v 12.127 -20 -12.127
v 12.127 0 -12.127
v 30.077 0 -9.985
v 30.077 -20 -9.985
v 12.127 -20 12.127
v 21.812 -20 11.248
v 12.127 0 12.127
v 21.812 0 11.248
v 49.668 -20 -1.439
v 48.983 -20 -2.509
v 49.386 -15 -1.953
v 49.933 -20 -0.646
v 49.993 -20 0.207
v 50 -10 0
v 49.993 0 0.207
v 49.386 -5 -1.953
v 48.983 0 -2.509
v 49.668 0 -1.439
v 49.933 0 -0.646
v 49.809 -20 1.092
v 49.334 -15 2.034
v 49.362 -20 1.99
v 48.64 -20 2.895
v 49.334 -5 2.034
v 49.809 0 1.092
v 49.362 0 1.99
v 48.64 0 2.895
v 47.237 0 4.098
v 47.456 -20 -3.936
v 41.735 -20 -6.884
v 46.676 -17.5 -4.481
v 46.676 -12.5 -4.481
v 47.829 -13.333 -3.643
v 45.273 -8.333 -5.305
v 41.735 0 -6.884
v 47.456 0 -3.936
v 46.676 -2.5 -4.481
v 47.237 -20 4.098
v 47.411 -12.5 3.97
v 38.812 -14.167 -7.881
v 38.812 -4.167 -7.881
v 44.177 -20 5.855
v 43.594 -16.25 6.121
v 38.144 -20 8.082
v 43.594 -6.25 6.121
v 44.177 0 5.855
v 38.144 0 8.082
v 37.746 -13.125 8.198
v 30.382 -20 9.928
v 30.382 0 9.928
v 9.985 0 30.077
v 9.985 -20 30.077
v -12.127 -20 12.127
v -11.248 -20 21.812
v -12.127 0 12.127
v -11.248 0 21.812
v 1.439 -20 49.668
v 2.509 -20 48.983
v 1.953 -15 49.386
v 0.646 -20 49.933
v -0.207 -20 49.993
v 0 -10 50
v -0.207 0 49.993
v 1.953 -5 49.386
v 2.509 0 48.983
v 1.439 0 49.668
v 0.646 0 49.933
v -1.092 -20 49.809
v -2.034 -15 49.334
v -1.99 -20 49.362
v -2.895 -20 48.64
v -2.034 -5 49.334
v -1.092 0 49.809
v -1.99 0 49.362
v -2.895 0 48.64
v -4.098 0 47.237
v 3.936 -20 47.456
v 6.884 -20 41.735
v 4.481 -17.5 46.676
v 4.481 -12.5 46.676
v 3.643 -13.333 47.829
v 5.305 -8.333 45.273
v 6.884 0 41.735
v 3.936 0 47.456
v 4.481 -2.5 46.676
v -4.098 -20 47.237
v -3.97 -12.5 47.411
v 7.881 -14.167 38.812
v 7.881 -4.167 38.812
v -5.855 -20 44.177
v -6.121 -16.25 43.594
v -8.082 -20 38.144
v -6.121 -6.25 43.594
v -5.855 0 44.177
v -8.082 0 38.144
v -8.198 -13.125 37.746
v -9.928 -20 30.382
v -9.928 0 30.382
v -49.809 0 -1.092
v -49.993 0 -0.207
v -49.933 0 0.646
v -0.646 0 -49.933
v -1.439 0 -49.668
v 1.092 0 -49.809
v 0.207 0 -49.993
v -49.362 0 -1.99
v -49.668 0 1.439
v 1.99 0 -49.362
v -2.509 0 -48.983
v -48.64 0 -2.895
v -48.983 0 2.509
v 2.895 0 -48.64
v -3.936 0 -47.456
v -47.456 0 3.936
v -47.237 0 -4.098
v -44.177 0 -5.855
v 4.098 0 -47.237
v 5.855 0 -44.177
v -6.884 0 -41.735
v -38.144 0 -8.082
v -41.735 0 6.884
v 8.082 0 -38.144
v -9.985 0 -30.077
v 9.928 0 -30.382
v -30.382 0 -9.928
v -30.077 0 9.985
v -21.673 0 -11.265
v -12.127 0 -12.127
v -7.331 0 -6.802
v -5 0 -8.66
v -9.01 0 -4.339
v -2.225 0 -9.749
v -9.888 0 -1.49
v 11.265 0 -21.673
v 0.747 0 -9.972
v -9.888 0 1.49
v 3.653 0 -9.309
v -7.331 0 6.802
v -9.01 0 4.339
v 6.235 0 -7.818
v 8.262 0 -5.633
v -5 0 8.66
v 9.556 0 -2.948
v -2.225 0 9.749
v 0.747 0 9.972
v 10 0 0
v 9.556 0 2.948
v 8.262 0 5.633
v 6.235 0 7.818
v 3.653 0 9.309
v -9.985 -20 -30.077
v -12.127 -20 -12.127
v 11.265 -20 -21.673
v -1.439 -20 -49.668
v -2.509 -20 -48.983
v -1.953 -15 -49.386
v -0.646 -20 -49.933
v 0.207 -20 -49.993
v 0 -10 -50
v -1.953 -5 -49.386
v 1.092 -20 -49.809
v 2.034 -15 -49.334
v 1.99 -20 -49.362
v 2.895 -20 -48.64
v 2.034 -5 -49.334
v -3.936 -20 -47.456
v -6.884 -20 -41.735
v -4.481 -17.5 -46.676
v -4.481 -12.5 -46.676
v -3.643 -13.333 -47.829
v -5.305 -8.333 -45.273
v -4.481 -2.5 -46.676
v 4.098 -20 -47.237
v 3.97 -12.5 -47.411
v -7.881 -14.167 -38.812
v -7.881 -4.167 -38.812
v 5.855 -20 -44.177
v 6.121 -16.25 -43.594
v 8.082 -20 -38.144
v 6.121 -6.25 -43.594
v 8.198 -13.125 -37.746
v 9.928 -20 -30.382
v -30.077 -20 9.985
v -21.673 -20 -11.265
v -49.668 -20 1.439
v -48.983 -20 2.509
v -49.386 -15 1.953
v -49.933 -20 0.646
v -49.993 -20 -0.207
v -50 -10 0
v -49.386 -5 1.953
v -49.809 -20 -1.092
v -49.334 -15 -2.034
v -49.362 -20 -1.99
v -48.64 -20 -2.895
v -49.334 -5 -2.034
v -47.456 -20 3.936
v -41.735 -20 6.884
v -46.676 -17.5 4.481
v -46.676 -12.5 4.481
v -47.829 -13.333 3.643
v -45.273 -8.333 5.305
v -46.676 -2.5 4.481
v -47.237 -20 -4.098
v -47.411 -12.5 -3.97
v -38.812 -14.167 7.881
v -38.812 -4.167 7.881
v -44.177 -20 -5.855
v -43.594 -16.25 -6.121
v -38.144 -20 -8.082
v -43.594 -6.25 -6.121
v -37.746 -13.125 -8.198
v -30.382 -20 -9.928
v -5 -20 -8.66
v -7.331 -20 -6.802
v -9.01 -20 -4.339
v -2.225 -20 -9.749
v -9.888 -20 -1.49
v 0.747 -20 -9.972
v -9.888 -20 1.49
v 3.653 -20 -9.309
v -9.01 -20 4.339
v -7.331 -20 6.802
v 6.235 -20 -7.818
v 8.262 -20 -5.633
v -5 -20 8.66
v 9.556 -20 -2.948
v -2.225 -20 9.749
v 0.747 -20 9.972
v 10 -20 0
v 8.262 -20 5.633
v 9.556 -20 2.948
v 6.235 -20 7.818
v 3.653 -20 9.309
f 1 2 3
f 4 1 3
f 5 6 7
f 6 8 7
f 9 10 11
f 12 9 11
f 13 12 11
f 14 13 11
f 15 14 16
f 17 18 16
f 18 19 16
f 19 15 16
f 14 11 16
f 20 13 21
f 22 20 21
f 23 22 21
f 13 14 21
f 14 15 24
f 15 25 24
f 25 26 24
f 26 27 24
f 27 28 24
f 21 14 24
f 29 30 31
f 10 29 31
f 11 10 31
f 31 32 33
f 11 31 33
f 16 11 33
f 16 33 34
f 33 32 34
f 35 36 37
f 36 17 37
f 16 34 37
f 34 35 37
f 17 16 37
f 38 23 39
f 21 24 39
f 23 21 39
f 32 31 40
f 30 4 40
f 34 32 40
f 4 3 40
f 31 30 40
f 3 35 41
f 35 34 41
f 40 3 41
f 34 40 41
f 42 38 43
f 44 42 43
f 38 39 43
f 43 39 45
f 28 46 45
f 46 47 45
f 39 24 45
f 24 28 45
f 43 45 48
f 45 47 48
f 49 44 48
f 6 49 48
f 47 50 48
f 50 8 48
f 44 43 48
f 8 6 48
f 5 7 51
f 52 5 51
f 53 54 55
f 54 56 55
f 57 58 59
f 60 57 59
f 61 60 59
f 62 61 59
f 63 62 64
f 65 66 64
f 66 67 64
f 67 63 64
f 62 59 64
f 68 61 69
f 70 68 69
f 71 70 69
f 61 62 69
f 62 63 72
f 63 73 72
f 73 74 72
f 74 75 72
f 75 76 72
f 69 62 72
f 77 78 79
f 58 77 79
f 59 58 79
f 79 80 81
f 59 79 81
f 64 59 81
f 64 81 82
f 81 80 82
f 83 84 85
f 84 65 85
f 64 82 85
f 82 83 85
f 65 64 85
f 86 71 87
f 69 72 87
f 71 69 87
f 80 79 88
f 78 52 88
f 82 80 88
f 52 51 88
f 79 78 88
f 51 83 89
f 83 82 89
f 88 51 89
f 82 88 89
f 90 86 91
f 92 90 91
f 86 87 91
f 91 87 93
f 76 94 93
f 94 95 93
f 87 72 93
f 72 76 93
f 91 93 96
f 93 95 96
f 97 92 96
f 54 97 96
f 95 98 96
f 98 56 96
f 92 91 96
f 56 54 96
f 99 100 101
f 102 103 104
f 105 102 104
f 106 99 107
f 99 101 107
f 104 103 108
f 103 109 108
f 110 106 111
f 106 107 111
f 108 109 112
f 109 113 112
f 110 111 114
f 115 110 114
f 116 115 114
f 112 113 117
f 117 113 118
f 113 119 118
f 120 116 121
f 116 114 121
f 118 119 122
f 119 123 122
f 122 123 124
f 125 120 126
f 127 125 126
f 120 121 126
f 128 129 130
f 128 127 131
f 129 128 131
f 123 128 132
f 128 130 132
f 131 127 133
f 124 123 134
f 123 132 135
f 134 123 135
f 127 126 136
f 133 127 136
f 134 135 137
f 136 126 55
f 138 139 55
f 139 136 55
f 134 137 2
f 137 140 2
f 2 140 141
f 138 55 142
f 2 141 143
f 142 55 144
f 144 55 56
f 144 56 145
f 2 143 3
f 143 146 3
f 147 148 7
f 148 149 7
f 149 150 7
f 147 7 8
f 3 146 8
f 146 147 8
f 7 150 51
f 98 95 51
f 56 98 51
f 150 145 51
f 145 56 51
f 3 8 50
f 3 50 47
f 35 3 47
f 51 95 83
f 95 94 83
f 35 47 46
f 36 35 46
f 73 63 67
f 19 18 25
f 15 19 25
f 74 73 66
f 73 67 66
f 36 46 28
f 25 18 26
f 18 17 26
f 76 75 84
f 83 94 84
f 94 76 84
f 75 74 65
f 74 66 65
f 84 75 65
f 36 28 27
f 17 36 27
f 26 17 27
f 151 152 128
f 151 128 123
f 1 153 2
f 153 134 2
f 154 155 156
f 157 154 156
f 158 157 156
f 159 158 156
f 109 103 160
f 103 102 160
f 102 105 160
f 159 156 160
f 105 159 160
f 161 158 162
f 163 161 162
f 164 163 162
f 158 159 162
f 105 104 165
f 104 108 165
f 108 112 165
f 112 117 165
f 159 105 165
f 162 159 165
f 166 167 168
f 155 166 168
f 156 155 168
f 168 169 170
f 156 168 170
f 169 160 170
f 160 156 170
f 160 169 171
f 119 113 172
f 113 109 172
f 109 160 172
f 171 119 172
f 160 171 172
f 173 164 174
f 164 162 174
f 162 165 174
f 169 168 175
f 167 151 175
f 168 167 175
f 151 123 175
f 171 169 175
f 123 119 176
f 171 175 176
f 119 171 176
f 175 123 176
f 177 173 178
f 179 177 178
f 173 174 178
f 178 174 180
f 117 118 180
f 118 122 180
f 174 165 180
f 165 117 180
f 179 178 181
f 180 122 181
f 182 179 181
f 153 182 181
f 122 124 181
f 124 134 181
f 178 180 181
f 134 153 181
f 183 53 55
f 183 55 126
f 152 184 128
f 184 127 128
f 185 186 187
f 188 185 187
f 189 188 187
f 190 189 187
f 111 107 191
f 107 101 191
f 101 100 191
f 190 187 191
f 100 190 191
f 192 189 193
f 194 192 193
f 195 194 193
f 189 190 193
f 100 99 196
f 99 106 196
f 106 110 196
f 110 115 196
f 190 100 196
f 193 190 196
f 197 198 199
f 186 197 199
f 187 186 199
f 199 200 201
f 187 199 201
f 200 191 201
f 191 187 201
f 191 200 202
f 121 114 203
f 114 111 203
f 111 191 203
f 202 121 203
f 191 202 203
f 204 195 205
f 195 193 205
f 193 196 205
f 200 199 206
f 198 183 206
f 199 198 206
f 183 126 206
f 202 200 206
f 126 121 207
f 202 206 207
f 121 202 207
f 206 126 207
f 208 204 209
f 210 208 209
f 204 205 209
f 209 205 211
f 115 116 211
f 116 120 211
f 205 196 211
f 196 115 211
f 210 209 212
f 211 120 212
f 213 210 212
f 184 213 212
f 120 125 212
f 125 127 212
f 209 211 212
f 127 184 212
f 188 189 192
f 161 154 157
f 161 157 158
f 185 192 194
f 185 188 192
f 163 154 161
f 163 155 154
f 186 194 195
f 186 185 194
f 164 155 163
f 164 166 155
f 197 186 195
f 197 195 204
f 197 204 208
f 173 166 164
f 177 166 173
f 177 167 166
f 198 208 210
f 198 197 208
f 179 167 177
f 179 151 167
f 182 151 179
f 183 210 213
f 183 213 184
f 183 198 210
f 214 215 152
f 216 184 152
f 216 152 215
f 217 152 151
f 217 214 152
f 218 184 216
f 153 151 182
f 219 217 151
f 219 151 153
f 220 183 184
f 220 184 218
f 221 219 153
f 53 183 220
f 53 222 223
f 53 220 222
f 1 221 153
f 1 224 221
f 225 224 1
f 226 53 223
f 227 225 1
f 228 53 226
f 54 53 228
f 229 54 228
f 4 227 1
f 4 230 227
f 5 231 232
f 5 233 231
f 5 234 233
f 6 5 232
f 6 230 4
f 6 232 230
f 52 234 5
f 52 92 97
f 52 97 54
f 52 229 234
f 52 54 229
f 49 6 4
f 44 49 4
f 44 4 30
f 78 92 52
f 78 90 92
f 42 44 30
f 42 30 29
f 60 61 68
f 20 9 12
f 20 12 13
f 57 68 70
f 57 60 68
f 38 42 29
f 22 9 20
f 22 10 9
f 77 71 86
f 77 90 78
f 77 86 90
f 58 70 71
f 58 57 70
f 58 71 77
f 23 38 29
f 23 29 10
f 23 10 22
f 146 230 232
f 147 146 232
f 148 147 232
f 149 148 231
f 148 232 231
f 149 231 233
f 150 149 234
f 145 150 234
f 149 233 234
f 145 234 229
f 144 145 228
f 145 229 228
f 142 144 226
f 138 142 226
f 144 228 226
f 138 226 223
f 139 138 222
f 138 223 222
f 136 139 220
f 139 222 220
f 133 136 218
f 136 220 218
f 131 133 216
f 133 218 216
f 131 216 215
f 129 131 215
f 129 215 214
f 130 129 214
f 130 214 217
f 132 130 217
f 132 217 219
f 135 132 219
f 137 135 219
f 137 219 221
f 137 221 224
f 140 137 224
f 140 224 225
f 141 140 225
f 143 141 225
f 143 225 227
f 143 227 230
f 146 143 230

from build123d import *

# Parameters (mm, degrees)
F1_DEPTH = 20
F2_R     = 10
F3_DEPTH = 20.0010001


with BuildPart() as f1:
    # F0 (on Front) → F1 (new body)
    with BuildSketch(Plane.XZ):
        with BuildLine():
            add(Edge.make_bspline(
                [(12.1267812518, 12.1267812518), (9.7597050801, 50), (0, 50)],
                knots=[4.9573676435, 4.9573676435, 4.9573676435, 6.2831853072, 6.2831853072, 6.2831853072], degree=2, weights=[1, 0.788205438, 1]))
            add(Edge.make_bspline(
                [(0, 50), (-9.7597050801, 50), (-12.1267812518, 12.1267812518)],
                knots=[0, 0, 0, 1.3258176637, 1.3258176637, 1.3258176637], degree=2, weights=[1, 0.788205438, 1]))
            add(Edge.make_bspline(
                [(12.1267812518, 12.1267812518), (0, 12.8847050801), (-12.1267812518, 12.1267812518)],
                knots=[1.3258176637, 1.3258176637, 1.3258176637, 1.8157749899, 1.8157749899, 1.8157749899], degree=2, weights=[1, 0.9701425001, 1]))
        make_face()
        with BuildLine():
            add(Edge.make_bspline(
                [(12.1267812518, 12.1267812518), (0, 12.8847050801), (-12.1267812518, 12.1267812518)],
                knots=[1.3258176637, 1.3258176637, 1.3258176637, 1.8157749899, 1.8157749899, 1.8157749899], degree=2, weights=[1, 0.9701425001, 1]))
            add(Edge.make_bspline(
                [(-12.1267812518, 12.1267812518), (-12.8847050801, 0), (-12.1267812518, -12.1267812518)],
                knots=[1.3258176637, 1.3258176637, 1.3258176637, 1.8157749899, 1.8157749899, 1.8157749899], degree=2, weights=[1, 0.9701425001, 1]))
            add(Edge.make_bspline(
                [(-12.1267812518, -12.1267812518), (0, -12.8847050801), (12.1267812518, -12.1267812518)],
                knots=[4.4674103173, 4.4674103173, 4.4674103173, 4.9573676435, 4.9573676435, 4.9573676435], degree=2, weights=[1, 0.9701425001, 1]))
            add(Edge.make_bspline(
                [(12.1267812518, -12.1267812518), (12.8847050801, 0), (12.1267812518, 12.1267812518)],
                knots=[4.4674103173, 4.4674103173, 4.4674103173, 4.9573676435, 4.9573676435, 4.9573676435], degree=2, weights=[1, 0.9701425001, 1]))
        make_face()
        with BuildLine():
            add(Edge.make_bspline(
                [(-12.1267812518, 12.1267812518), (-12.8847050801, 0), (-12.1267812518, -12.1267812518)],
                knots=[1.3258176637, 1.3258176637, 1.3258176637, 1.8157749899, 1.8157749899, 1.8157749899], degree=2, weights=[1, 0.9701425001, 1]))
            add(Edge.make_bspline(
                [(-12.1267812518, 12.1267812518), (-50, 9.7597050801), (-50, 0), (-50, -9.7597050801), (-12.1267812518, -12.1267812518)],
                knots=[1.8157749899, 1.8157749899, 1.8157749899, 3.1415926536, 3.1415926536, 4.4674103173, 4.4674103173, 4.4674103173], degree=2, weights=[1, 0.788205438, 1, 0.788205438, 1]))
        make_face()
        with BuildLine():
            add(Edge.make_bspline(
                [(50, 0), (50, 9.7597050801), (12.1267812518, 12.1267812518)],
                knots=[0, 0, 0, 1.3258176637, 1.3258176637, 1.3258176637], degree=2, weights=[1, 0.788205438, 1]))
            add(Edge.make_bspline(
                [(12.1267812518, -12.1267812518), (12.8847050801, 0), (12.1267812518, 12.1267812518)],
                knots=[4.4674103173, 4.4674103173, 4.4674103173, 4.9573676435, 4.9573676435, 4.9573676435], degree=2, weights=[1, 0.9701425001, 1]))
            add(Edge.make_bspline(
                [(12.1267812518, -12.1267812518), (50, -9.7597050801), (50, 0)],
                knots=[4.9573676435, 4.9573676435, 4.9573676435, 6.2831853072, 6.2831853072, 6.2831853072], degree=2, weights=[1, 0.788205438, 1]))
        make_face()
        with BuildLine():
            add(Edge.make_bspline(
                [(-12.1267812518, -12.1267812518), (0, -12.8847050801), (12.1267812518, -12.1267812518)],
                knots=[4.4674103173, 4.4674103173, 4.4674103173, 4.9573676435, 4.9573676435, 4.9573676435], degree=2, weights=[1, 0.9701425001, 1]))
            add(Edge.make_bspline(
                [(-12.1267812518, -12.1267812518), (-9.7597050801, -50), (0, -50), (9.7597050801, -50), (12.1267812518, -12.1267812518)],
                knots=[1.8157749899, 1.8157749899, 1.8157749899, 3.1415926536, 3.1415926536, 4.4674103173, 4.4674103173, 4.4674103173], degree=2, weights=[1, 0.788205438, 1, 0.788205438, 1]))
        make_face()
    extrude(amount=F1_DEPTH)

    # F2 (on face) → F3 (cut, through all)
    with BuildSketch(Plane.XZ.offset(20)):
        Circle(F2_R)
    extrude(amount=-F3_DEPTH, mode=Mode.SUBTRACT)


solid = f1.part
